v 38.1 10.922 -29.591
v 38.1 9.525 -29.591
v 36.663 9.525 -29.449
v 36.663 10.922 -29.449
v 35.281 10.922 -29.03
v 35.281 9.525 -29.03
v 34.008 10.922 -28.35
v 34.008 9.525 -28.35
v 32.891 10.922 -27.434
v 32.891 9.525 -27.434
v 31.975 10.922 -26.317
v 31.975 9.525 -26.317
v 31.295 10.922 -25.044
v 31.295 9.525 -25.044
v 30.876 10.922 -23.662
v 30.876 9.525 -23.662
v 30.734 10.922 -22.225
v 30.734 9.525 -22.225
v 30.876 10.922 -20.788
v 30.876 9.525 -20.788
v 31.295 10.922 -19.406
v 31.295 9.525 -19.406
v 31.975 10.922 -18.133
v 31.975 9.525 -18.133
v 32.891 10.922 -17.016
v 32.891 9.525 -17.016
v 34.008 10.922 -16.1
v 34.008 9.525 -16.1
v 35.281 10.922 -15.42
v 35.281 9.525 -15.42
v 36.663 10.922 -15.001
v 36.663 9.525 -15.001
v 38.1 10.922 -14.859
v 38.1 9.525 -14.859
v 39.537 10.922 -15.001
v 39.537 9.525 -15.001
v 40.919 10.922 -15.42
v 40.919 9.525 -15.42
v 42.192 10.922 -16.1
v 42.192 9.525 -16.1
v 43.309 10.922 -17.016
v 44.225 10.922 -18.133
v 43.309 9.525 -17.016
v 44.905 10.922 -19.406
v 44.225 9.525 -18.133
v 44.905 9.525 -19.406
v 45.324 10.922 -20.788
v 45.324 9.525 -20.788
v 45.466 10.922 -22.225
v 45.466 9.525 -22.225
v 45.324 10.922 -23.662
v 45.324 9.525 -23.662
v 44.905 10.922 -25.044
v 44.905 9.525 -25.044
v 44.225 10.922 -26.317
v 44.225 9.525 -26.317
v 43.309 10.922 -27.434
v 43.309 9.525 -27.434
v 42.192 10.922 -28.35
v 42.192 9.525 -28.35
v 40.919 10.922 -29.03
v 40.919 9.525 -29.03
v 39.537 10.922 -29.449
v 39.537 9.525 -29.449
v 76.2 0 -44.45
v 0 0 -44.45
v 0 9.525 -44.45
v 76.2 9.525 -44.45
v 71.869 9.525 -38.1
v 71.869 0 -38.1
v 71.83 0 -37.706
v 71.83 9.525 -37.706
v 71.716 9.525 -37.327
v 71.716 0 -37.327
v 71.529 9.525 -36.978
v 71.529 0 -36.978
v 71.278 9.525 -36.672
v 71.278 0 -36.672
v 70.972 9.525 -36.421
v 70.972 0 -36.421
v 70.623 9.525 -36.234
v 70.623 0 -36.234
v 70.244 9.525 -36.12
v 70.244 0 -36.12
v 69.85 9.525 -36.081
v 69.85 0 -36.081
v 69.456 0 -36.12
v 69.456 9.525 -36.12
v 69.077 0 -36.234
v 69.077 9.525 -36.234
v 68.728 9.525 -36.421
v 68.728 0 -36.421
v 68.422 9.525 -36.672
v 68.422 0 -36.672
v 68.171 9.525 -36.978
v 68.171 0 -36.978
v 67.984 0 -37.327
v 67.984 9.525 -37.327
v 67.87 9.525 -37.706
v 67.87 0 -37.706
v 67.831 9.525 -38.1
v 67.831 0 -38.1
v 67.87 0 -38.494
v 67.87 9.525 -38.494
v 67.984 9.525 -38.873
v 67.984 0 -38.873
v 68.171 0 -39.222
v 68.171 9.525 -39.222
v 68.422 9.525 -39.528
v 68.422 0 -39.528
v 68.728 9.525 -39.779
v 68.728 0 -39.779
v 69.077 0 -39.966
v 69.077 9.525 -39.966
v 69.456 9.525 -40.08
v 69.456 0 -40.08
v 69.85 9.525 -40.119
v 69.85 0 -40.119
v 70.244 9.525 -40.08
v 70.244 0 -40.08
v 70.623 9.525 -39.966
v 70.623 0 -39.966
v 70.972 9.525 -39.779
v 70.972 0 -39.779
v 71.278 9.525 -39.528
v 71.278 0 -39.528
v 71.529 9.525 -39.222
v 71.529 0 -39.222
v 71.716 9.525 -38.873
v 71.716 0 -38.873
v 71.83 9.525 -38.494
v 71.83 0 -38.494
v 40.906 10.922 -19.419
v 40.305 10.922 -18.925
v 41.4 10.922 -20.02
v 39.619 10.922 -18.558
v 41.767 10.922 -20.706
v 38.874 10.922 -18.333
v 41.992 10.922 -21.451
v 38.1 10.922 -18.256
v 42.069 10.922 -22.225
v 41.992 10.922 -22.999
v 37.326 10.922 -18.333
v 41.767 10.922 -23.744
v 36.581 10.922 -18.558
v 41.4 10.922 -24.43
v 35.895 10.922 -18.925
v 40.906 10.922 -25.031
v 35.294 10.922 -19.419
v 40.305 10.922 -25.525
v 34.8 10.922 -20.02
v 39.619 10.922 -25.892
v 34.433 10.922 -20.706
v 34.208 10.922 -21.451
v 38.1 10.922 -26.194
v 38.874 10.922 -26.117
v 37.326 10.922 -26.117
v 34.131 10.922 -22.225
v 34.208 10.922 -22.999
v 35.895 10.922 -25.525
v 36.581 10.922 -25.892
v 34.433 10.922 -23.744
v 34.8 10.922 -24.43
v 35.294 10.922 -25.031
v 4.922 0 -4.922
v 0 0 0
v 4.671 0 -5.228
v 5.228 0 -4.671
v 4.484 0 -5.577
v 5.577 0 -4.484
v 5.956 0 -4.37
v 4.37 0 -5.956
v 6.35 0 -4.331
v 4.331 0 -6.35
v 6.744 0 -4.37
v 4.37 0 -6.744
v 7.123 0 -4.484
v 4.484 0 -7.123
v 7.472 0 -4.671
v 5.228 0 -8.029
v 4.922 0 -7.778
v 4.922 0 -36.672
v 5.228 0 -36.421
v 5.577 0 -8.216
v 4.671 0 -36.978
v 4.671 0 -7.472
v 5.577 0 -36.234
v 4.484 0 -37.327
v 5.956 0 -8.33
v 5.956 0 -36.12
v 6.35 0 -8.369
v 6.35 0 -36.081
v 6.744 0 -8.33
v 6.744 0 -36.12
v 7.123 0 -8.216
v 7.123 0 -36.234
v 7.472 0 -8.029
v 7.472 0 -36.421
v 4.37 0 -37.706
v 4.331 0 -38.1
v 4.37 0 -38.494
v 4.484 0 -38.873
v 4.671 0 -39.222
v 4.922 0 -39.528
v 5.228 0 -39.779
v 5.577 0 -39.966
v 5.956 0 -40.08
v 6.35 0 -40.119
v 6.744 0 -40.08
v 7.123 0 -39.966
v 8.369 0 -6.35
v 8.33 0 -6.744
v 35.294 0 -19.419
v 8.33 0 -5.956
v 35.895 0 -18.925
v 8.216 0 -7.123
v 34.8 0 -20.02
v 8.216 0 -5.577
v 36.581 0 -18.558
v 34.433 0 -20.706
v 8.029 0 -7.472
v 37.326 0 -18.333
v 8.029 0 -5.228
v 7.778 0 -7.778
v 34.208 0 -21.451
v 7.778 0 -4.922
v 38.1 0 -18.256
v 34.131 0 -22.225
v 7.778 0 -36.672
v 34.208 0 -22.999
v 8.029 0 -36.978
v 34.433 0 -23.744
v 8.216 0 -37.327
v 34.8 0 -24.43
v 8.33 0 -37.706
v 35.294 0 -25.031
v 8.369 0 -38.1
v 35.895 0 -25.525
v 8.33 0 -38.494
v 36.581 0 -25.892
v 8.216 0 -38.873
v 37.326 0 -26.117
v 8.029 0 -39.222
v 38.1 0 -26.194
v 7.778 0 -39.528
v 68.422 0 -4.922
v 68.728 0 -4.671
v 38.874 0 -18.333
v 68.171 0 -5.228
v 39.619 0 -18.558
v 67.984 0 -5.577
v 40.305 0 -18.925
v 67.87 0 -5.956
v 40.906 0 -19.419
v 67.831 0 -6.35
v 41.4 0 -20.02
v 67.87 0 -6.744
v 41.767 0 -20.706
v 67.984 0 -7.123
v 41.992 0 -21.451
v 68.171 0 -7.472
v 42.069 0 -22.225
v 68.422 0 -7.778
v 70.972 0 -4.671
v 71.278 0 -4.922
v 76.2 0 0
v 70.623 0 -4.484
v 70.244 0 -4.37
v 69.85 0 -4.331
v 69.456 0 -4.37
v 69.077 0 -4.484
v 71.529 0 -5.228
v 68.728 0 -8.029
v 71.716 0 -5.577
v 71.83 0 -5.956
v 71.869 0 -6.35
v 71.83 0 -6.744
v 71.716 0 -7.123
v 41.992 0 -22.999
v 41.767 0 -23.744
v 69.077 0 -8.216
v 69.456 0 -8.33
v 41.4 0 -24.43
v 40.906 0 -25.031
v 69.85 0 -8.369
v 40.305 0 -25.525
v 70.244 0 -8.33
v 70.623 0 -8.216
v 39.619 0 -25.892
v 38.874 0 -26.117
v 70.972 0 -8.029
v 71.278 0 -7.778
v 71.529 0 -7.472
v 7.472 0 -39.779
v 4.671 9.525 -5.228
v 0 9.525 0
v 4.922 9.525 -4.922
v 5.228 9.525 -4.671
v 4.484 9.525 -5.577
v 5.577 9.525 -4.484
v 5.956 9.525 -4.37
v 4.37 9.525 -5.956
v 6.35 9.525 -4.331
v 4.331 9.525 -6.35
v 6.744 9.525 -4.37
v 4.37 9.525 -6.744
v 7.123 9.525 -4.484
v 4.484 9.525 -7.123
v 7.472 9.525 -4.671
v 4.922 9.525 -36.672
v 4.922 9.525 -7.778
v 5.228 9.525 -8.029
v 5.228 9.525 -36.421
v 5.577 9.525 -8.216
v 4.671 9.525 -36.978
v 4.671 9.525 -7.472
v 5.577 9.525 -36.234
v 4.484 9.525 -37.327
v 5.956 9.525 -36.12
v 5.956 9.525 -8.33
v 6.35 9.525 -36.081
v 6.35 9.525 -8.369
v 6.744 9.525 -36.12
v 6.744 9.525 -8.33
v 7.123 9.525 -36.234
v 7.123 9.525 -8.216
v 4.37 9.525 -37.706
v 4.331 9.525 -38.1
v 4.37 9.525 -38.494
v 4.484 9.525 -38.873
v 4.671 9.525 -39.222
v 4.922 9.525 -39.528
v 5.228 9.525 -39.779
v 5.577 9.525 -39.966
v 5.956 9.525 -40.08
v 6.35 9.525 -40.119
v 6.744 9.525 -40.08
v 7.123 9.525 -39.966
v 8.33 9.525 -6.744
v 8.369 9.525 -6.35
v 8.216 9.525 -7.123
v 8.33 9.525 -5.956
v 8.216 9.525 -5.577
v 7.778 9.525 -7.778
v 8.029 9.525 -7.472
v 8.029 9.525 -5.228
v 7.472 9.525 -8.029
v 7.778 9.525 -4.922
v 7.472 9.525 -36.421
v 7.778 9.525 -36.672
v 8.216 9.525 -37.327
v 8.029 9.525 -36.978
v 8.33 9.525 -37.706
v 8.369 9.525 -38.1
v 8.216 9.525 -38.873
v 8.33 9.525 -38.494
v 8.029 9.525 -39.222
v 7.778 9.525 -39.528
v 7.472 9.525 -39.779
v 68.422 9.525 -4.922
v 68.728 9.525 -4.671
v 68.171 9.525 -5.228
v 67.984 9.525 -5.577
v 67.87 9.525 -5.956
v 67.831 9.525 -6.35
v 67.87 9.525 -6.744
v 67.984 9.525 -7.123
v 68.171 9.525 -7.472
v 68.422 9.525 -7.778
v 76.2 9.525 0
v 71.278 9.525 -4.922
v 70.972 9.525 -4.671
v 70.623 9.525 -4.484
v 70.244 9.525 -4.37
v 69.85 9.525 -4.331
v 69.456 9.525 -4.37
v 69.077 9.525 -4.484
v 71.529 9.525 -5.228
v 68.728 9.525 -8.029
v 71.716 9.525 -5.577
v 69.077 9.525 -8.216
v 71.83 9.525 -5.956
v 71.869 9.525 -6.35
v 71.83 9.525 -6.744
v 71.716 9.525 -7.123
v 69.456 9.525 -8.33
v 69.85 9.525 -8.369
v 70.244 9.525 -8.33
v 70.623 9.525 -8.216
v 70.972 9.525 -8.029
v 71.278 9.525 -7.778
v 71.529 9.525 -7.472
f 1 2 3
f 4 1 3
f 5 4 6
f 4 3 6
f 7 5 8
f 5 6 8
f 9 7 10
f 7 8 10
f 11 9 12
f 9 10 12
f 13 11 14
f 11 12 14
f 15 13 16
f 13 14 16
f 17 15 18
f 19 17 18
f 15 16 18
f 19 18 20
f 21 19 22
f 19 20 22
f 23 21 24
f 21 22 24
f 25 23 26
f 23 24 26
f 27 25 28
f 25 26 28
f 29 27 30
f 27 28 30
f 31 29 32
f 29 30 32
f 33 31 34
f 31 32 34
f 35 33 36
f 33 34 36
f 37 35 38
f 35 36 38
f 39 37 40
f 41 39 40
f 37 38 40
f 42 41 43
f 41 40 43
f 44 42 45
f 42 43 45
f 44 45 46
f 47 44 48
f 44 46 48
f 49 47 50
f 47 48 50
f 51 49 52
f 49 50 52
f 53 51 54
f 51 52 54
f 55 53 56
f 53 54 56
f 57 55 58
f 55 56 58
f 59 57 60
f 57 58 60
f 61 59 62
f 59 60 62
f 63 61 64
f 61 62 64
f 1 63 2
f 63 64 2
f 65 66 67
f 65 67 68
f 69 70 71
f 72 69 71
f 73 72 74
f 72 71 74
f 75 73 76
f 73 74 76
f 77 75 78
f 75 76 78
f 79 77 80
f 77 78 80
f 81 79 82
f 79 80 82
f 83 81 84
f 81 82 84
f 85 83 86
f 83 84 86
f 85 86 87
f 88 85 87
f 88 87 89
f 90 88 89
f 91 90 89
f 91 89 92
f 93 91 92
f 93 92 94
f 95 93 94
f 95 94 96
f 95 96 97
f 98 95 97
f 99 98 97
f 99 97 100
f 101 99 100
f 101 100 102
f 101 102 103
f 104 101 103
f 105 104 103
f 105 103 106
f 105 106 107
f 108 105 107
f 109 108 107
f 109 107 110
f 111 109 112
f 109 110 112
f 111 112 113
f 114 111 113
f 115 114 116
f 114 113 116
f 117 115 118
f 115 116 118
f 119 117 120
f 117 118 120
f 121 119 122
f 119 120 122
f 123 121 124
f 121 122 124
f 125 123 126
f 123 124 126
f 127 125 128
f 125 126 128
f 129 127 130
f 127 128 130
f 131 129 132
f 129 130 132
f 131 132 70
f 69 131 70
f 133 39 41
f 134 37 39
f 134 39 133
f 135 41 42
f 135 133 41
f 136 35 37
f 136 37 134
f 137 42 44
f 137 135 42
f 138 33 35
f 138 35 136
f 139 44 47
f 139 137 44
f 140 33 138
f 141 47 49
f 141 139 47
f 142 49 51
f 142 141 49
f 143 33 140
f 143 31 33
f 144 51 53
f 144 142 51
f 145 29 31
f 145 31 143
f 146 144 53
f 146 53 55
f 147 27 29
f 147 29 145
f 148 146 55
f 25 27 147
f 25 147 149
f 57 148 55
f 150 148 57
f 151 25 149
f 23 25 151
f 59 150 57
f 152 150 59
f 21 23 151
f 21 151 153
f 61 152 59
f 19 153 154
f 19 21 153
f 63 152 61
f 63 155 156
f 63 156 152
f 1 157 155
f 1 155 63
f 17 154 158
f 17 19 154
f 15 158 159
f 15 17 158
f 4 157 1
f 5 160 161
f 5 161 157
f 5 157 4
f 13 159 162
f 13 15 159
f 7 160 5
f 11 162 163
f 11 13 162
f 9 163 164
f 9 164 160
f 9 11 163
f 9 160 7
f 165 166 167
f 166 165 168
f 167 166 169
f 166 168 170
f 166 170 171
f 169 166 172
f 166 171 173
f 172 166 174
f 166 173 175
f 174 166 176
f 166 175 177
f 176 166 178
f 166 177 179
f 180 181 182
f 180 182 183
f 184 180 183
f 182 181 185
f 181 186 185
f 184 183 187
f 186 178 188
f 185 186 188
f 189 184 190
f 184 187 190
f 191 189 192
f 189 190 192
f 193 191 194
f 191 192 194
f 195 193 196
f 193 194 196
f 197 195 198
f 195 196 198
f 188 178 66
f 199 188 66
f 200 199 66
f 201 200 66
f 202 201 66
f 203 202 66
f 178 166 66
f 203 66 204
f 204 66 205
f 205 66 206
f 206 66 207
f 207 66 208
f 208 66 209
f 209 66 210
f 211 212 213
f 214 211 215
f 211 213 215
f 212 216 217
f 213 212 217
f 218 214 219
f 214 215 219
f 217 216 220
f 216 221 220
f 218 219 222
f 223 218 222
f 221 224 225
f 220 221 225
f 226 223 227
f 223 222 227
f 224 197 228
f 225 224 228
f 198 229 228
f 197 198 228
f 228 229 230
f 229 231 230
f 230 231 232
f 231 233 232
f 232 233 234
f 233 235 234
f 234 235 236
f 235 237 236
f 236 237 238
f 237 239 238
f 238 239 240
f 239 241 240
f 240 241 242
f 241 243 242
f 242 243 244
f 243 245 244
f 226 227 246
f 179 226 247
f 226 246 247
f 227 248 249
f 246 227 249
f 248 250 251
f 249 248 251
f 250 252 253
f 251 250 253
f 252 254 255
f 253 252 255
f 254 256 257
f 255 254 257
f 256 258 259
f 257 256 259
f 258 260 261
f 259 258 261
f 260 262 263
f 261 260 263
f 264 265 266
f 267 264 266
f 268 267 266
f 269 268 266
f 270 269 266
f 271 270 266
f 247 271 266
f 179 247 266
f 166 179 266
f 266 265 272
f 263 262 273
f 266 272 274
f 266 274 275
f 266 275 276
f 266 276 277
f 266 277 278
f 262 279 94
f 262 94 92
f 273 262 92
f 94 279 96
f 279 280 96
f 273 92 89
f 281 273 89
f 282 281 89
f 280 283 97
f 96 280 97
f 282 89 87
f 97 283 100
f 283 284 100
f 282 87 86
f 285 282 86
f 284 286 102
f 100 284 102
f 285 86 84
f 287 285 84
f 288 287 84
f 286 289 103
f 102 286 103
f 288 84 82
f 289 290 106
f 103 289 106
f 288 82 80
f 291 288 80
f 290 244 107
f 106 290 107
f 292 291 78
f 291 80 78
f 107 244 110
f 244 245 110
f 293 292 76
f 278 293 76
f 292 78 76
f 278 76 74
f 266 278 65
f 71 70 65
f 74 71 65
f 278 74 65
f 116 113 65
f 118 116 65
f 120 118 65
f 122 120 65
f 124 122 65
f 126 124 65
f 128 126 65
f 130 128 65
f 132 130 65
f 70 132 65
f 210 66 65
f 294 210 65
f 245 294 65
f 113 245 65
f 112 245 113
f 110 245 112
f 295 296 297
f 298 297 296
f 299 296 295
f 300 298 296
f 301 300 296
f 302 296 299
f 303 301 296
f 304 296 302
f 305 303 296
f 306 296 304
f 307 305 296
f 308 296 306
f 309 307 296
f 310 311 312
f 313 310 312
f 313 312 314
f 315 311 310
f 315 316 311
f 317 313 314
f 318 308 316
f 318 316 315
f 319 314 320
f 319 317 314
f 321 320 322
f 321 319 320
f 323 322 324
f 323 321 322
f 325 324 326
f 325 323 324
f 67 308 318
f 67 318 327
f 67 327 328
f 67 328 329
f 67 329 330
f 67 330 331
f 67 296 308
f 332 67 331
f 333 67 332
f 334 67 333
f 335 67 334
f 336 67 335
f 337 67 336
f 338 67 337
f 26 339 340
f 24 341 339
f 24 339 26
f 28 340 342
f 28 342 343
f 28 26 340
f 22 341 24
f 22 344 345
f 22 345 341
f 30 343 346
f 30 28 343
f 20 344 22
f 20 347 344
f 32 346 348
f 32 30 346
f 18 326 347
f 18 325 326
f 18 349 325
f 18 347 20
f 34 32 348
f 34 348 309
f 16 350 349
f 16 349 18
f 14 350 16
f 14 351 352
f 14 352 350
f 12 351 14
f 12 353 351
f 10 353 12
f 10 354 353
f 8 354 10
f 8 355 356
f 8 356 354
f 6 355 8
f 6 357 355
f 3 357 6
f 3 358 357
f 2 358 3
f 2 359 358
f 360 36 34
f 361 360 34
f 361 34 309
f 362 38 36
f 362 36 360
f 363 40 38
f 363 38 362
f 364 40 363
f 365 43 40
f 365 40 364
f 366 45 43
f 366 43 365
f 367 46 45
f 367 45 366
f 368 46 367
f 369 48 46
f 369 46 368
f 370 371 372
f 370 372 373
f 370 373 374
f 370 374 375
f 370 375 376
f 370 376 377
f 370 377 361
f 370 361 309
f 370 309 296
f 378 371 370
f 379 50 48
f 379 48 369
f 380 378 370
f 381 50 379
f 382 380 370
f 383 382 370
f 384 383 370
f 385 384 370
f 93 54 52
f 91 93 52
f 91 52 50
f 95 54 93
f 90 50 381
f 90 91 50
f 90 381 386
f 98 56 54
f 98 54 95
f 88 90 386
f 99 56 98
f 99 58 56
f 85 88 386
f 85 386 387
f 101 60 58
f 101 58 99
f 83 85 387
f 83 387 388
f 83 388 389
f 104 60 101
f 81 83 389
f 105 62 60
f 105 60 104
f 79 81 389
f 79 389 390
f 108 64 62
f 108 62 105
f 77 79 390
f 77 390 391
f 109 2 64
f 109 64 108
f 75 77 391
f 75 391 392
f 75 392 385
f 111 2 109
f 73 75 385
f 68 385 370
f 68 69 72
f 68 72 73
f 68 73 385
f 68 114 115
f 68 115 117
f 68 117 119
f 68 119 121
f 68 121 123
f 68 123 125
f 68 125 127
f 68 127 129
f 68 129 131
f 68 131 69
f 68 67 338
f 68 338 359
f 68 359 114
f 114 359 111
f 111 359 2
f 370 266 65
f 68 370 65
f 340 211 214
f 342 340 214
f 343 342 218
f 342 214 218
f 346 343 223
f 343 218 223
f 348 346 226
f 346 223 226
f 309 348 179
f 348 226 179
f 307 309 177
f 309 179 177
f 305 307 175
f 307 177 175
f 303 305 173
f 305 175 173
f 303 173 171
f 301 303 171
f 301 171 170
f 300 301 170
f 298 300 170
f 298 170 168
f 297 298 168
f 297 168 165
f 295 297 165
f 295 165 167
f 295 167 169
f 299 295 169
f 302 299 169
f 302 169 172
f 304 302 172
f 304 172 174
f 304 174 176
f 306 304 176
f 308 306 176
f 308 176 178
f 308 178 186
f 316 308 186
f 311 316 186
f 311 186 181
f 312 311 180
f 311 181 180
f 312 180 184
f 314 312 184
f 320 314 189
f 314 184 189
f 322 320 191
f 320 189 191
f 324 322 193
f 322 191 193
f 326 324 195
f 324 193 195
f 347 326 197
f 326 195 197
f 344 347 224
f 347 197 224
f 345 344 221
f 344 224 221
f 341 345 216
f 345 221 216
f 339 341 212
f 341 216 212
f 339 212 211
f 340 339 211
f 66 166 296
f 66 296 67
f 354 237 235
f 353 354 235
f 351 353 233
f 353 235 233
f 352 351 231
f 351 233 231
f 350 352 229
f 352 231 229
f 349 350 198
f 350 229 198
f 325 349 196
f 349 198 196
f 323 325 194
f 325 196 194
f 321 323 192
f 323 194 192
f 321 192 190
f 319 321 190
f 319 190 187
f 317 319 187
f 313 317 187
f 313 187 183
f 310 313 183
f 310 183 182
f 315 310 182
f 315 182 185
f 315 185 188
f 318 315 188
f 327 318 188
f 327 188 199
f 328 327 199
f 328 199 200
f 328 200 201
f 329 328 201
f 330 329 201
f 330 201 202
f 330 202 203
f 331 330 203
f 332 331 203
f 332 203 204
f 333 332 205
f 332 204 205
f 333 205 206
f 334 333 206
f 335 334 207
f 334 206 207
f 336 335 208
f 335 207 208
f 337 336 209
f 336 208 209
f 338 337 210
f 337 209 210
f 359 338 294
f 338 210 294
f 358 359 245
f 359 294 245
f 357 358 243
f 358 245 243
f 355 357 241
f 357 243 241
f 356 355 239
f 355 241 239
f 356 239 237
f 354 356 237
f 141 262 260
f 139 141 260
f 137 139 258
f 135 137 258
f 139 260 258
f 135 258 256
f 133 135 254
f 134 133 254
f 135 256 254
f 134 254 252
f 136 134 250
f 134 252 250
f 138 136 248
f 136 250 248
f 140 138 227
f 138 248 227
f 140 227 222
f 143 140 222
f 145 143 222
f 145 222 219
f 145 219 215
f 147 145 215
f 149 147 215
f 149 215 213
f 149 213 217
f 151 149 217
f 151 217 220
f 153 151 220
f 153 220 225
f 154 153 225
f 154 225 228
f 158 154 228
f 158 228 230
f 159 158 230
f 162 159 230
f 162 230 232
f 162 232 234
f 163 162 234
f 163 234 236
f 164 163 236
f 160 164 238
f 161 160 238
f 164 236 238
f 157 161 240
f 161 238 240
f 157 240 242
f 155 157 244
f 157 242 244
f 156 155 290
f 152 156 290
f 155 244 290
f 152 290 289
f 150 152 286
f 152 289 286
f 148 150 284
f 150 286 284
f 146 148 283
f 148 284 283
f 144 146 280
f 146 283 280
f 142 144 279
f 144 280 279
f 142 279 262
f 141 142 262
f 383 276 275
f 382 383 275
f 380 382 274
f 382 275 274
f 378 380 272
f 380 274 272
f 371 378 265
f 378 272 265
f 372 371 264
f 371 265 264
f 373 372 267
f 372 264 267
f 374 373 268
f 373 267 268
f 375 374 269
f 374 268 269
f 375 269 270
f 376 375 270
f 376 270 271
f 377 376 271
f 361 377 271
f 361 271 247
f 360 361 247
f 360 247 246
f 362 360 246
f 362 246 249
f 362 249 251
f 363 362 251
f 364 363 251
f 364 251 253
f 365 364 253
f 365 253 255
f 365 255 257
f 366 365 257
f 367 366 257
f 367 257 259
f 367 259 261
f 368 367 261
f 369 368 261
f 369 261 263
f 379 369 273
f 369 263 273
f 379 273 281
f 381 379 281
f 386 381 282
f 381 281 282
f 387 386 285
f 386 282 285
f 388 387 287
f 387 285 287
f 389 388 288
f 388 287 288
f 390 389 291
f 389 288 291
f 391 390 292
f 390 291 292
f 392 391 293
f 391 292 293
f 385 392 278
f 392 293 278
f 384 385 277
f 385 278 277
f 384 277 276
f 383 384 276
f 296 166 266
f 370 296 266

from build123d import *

# Parameters (mm, degrees)
SKETCH1_W               = 76.2
SKETCH1_H               = 44.45
BOSS_EXTRUDE1_DEPTH     = 9.525
F_10_32_TAPPED_HOLE1_D  = 4.0386
SKETCH9_R               = 7.366
BOSS_EXTRUDE2_DEPTH     = 1.397
F_3_8_16_TAPPED_HOLE1_D = 7.9375


with BuildPart() as part:
    # Sketch1 → Boss-Extrude1 (new body)
    with BuildSketch(Plane(origin=(0, 0, 0), x_dir=(1, 0, 0), z_dir=(0, 1, 0))):
        with Locations((38.1, 22.225)):
            Rectangle(SKETCH1_W, SKETCH1_H)
    extrude(amount=BOSS_EXTRUDE1_DEPTH)

    # #10-32 Tapped Hole1 (through all)
    with Locations(Plane(origin=(0, 9.525, 0), x_dir=(-1, 0, 0), z_dir=(0, 1, 0))):
        with Locations((-6.35, -38.1), (-69.85, -38.1), (-69.85, -6.35), (-6.35, -6.35)):
            Hole(F_10_32_TAPPED_HOLE1_D / 2)

    # Sketch9 → Boss-Extrude2 (add)
    with BuildSketch(Plane(origin=(0, 9.525, 0), x_dir=(1, 0, 0), z_dir=(0, 1, 0))):
        with Locations(Location((38.1, 22.225, 0), (0, 0, 90))):
            Circle(SKETCH9_R)
    extrude(amount=BOSS_EXTRUDE2_DEPTH)

    # 3/8-16 Tapped Hole1 (through all)
    with Locations(Plane(origin=(0, 10.922, 0), x_dir=(-1, 0, 0), z_dir=(0, 1, 0))):
        with Locations((-38.1, -22.225)):
            Hole(F_3_8_16_TAPPED_HOLE1_D / 2)


solid = part.part
